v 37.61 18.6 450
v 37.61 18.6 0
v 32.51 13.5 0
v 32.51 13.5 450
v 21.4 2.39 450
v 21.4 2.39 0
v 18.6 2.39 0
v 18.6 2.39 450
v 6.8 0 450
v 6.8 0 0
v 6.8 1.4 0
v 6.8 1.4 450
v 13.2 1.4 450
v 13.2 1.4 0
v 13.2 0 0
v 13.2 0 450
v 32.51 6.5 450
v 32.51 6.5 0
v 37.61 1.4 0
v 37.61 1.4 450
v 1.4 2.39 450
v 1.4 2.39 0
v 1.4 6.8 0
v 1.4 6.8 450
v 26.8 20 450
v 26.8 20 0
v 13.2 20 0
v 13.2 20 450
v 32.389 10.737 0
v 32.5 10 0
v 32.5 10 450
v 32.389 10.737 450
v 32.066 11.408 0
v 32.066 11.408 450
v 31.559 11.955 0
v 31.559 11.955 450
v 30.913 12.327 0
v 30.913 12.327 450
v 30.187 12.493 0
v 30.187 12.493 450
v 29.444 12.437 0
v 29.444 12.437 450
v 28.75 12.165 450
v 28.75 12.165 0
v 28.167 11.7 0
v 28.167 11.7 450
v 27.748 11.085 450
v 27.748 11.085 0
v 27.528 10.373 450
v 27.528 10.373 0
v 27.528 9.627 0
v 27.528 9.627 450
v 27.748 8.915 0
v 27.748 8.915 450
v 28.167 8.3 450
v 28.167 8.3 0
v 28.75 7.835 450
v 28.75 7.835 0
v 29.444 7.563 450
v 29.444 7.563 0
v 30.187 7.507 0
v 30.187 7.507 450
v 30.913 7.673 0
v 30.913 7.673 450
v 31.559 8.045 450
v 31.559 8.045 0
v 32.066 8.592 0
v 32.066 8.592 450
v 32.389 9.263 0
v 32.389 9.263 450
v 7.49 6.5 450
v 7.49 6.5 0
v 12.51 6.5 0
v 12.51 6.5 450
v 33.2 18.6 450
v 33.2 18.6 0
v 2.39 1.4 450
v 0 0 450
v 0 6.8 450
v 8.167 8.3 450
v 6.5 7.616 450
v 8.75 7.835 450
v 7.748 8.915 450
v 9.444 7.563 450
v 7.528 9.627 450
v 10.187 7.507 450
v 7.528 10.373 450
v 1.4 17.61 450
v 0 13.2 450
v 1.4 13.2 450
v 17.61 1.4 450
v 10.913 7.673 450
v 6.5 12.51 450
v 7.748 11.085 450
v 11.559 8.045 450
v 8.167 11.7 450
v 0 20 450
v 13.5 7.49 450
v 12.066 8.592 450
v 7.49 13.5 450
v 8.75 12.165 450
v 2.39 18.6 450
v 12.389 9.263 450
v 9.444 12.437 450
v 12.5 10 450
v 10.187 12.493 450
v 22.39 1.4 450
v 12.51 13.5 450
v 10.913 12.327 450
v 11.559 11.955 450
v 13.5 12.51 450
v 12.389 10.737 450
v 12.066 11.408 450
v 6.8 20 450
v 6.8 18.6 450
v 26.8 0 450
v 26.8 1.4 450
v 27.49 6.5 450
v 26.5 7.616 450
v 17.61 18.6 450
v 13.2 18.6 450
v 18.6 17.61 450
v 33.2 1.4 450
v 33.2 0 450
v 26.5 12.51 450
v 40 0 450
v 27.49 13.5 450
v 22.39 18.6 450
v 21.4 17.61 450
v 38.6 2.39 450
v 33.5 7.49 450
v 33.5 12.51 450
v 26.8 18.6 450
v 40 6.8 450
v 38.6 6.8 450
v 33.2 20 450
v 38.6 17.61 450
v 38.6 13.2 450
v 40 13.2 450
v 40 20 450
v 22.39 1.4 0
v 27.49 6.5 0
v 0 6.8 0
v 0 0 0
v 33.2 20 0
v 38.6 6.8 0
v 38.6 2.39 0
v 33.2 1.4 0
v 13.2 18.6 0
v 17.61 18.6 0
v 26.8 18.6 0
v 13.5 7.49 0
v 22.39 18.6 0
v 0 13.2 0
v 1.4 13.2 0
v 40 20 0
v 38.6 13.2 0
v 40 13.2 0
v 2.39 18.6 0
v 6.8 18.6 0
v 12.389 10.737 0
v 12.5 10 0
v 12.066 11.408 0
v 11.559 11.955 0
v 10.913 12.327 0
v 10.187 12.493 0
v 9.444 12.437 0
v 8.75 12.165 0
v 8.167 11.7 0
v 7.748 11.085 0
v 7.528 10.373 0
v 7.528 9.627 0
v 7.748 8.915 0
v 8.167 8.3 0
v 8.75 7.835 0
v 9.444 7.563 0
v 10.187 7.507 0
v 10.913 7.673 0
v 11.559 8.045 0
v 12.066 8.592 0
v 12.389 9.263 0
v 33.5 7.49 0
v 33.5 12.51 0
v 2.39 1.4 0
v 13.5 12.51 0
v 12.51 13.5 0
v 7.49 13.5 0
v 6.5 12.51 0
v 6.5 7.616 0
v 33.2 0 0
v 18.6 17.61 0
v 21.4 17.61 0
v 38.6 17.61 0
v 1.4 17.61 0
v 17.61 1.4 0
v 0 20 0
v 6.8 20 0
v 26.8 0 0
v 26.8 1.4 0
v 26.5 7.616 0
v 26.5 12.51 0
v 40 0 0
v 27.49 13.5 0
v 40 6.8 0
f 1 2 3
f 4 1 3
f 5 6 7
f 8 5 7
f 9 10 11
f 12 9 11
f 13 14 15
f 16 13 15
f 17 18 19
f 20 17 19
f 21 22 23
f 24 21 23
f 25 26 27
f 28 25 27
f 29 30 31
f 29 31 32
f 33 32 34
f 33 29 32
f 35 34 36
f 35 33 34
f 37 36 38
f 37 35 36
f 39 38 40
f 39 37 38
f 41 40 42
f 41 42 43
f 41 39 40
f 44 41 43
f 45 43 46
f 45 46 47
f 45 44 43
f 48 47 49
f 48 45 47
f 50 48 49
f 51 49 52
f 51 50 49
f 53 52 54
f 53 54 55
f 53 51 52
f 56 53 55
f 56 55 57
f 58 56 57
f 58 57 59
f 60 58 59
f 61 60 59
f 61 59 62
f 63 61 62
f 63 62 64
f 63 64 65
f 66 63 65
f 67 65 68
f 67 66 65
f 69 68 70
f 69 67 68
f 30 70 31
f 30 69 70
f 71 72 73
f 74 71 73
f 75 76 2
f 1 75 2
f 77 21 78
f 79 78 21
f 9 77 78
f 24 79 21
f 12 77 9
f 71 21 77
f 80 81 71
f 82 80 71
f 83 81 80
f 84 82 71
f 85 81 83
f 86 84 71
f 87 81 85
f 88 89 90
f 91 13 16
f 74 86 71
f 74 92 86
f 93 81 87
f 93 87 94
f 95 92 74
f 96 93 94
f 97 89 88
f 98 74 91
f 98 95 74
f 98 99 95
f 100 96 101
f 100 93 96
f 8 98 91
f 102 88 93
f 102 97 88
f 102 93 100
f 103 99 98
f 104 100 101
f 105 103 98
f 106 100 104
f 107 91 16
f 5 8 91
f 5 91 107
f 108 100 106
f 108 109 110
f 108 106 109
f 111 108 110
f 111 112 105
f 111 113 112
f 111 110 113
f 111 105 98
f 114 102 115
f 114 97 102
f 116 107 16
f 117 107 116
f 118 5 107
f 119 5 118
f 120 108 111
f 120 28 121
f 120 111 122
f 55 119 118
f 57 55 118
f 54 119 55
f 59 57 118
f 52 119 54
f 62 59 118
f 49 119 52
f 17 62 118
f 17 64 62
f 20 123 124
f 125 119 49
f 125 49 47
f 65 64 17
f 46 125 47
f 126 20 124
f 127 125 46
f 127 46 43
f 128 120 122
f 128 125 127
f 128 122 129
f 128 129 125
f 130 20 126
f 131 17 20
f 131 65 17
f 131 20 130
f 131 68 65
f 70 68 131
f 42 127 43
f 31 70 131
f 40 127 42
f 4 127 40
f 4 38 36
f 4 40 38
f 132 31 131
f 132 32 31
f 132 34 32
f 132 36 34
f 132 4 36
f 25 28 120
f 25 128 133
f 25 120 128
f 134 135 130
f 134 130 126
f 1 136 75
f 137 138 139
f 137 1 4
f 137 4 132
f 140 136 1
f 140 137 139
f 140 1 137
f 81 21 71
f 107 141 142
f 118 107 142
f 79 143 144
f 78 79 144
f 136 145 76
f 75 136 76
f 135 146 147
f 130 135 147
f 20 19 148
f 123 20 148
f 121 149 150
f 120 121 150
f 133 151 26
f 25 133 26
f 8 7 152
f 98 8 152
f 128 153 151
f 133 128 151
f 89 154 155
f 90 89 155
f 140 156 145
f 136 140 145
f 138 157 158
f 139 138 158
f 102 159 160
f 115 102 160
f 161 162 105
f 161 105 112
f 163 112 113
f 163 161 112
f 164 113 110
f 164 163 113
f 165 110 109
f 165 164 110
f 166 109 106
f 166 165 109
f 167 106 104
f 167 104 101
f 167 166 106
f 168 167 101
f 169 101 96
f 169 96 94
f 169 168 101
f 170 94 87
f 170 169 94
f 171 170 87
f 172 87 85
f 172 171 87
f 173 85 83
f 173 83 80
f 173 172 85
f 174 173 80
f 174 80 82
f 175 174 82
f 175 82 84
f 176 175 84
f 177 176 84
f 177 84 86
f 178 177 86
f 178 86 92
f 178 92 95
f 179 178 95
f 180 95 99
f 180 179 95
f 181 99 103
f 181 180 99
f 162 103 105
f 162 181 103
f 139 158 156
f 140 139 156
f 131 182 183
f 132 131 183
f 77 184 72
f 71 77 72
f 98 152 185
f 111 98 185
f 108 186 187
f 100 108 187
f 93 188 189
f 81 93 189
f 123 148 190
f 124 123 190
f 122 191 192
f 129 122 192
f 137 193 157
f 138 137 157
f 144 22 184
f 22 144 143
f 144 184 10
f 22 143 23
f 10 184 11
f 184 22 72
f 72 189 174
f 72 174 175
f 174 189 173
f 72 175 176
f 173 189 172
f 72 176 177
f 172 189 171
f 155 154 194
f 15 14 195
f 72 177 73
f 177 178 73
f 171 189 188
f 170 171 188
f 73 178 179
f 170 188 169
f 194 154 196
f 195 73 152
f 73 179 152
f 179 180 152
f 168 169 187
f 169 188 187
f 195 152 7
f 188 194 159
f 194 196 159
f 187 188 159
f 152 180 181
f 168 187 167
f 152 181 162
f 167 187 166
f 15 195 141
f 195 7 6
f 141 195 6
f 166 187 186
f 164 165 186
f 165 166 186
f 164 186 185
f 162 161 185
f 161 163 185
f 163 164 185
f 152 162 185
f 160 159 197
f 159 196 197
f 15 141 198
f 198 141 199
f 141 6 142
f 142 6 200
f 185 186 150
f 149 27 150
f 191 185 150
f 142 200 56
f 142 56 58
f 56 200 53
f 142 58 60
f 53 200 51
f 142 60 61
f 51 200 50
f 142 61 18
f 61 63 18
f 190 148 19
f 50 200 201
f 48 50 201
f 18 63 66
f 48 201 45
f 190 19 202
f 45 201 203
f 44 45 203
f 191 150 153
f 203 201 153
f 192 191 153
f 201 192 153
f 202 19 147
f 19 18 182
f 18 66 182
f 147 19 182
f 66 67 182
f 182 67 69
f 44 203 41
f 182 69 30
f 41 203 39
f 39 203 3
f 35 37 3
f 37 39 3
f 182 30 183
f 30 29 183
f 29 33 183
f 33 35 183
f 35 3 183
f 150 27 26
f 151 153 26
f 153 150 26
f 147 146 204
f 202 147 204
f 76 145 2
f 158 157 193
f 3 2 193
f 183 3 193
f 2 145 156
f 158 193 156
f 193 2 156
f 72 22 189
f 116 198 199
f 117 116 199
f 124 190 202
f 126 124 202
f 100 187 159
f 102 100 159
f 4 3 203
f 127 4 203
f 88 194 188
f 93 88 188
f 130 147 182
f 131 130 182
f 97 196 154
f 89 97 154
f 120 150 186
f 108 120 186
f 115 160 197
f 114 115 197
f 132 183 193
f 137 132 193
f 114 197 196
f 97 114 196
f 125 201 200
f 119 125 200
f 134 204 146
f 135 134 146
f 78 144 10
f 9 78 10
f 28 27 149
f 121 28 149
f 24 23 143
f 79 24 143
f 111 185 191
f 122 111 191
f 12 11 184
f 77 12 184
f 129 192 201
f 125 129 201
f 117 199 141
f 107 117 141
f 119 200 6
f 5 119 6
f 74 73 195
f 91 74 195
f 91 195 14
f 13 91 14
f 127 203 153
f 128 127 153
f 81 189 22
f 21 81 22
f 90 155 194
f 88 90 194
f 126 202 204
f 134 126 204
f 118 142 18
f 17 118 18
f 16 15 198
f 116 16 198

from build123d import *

# Parameters (mm, degrees)
F0_R     = 2.5
F1_DEPTH = 450


with BuildPart() as f1:
    # F0 (on Top) → F1 (new body)
    with BuildSketch(Plane.XY):
        Polygon((6.5, 7.616114), (1.4, 2.389949), (1.4, 6.8), (0, 6.8), (0, 0), (6.8, 0), (6.8, 1.4), (2.389949, 1.4), (7.489949, 6.5), (12.510051, 6.5), (17.610051, 1.4), (13.2, 1.4), (13.2, 0), (20, 0), (26.8, 0), (26.8, 1.4), (22.389949, 1.4), (27.489949, 6.5), (32.510051, 6.5), (37.610051, 1.4), (33.2, 1.4), (33.2, 0), (40, 0), (40, 6.8), (38.6, 6.8), (38.6, 2.389949), (33.5, 7.489949), (33.5, 12.510051), (38.6, 17.610051), (38.6, 13.2), (40, 13.2), (40, 20), (33.2, 20), (33.2, 18.6), (37.610051, 18.6), (32.510051, 13.5), (27.489949, 13.5), (22.389949, 18.6), (26.8, 18.6), (26.8, 20), (20, 20), (13.2, 20), (13.2, 18.6), (17.610051, 18.6), (12.510051, 13.5), (7.489949, 13.5), (2.389949, 18.6), (6.8, 18.6), (6.8, 20), (0, 20), (0, 13.2), (1.4, 13.2), (1.4, 17.610051), (6.5, 12.510051), align=None)
        with Locations((10, 10)):
            Circle(F0_R, mode=Mode.SUBTRACT)
        Polygon((13.5, 7.489949), (13.5, 12.510051), (18.6, 17.610051), (21.4, 17.610051), (26.5, 12.510051), (26.5, 7.616114), (21.4, 2.389949), (18.6, 2.389949), align=None, mode=Mode.SUBTRACT)
        with Locations((30, 10)):
            Circle(F0_R, mode=Mode.SUBTRACT)
    extrude(amount=F1_DEPTH)


solid = f1.part
